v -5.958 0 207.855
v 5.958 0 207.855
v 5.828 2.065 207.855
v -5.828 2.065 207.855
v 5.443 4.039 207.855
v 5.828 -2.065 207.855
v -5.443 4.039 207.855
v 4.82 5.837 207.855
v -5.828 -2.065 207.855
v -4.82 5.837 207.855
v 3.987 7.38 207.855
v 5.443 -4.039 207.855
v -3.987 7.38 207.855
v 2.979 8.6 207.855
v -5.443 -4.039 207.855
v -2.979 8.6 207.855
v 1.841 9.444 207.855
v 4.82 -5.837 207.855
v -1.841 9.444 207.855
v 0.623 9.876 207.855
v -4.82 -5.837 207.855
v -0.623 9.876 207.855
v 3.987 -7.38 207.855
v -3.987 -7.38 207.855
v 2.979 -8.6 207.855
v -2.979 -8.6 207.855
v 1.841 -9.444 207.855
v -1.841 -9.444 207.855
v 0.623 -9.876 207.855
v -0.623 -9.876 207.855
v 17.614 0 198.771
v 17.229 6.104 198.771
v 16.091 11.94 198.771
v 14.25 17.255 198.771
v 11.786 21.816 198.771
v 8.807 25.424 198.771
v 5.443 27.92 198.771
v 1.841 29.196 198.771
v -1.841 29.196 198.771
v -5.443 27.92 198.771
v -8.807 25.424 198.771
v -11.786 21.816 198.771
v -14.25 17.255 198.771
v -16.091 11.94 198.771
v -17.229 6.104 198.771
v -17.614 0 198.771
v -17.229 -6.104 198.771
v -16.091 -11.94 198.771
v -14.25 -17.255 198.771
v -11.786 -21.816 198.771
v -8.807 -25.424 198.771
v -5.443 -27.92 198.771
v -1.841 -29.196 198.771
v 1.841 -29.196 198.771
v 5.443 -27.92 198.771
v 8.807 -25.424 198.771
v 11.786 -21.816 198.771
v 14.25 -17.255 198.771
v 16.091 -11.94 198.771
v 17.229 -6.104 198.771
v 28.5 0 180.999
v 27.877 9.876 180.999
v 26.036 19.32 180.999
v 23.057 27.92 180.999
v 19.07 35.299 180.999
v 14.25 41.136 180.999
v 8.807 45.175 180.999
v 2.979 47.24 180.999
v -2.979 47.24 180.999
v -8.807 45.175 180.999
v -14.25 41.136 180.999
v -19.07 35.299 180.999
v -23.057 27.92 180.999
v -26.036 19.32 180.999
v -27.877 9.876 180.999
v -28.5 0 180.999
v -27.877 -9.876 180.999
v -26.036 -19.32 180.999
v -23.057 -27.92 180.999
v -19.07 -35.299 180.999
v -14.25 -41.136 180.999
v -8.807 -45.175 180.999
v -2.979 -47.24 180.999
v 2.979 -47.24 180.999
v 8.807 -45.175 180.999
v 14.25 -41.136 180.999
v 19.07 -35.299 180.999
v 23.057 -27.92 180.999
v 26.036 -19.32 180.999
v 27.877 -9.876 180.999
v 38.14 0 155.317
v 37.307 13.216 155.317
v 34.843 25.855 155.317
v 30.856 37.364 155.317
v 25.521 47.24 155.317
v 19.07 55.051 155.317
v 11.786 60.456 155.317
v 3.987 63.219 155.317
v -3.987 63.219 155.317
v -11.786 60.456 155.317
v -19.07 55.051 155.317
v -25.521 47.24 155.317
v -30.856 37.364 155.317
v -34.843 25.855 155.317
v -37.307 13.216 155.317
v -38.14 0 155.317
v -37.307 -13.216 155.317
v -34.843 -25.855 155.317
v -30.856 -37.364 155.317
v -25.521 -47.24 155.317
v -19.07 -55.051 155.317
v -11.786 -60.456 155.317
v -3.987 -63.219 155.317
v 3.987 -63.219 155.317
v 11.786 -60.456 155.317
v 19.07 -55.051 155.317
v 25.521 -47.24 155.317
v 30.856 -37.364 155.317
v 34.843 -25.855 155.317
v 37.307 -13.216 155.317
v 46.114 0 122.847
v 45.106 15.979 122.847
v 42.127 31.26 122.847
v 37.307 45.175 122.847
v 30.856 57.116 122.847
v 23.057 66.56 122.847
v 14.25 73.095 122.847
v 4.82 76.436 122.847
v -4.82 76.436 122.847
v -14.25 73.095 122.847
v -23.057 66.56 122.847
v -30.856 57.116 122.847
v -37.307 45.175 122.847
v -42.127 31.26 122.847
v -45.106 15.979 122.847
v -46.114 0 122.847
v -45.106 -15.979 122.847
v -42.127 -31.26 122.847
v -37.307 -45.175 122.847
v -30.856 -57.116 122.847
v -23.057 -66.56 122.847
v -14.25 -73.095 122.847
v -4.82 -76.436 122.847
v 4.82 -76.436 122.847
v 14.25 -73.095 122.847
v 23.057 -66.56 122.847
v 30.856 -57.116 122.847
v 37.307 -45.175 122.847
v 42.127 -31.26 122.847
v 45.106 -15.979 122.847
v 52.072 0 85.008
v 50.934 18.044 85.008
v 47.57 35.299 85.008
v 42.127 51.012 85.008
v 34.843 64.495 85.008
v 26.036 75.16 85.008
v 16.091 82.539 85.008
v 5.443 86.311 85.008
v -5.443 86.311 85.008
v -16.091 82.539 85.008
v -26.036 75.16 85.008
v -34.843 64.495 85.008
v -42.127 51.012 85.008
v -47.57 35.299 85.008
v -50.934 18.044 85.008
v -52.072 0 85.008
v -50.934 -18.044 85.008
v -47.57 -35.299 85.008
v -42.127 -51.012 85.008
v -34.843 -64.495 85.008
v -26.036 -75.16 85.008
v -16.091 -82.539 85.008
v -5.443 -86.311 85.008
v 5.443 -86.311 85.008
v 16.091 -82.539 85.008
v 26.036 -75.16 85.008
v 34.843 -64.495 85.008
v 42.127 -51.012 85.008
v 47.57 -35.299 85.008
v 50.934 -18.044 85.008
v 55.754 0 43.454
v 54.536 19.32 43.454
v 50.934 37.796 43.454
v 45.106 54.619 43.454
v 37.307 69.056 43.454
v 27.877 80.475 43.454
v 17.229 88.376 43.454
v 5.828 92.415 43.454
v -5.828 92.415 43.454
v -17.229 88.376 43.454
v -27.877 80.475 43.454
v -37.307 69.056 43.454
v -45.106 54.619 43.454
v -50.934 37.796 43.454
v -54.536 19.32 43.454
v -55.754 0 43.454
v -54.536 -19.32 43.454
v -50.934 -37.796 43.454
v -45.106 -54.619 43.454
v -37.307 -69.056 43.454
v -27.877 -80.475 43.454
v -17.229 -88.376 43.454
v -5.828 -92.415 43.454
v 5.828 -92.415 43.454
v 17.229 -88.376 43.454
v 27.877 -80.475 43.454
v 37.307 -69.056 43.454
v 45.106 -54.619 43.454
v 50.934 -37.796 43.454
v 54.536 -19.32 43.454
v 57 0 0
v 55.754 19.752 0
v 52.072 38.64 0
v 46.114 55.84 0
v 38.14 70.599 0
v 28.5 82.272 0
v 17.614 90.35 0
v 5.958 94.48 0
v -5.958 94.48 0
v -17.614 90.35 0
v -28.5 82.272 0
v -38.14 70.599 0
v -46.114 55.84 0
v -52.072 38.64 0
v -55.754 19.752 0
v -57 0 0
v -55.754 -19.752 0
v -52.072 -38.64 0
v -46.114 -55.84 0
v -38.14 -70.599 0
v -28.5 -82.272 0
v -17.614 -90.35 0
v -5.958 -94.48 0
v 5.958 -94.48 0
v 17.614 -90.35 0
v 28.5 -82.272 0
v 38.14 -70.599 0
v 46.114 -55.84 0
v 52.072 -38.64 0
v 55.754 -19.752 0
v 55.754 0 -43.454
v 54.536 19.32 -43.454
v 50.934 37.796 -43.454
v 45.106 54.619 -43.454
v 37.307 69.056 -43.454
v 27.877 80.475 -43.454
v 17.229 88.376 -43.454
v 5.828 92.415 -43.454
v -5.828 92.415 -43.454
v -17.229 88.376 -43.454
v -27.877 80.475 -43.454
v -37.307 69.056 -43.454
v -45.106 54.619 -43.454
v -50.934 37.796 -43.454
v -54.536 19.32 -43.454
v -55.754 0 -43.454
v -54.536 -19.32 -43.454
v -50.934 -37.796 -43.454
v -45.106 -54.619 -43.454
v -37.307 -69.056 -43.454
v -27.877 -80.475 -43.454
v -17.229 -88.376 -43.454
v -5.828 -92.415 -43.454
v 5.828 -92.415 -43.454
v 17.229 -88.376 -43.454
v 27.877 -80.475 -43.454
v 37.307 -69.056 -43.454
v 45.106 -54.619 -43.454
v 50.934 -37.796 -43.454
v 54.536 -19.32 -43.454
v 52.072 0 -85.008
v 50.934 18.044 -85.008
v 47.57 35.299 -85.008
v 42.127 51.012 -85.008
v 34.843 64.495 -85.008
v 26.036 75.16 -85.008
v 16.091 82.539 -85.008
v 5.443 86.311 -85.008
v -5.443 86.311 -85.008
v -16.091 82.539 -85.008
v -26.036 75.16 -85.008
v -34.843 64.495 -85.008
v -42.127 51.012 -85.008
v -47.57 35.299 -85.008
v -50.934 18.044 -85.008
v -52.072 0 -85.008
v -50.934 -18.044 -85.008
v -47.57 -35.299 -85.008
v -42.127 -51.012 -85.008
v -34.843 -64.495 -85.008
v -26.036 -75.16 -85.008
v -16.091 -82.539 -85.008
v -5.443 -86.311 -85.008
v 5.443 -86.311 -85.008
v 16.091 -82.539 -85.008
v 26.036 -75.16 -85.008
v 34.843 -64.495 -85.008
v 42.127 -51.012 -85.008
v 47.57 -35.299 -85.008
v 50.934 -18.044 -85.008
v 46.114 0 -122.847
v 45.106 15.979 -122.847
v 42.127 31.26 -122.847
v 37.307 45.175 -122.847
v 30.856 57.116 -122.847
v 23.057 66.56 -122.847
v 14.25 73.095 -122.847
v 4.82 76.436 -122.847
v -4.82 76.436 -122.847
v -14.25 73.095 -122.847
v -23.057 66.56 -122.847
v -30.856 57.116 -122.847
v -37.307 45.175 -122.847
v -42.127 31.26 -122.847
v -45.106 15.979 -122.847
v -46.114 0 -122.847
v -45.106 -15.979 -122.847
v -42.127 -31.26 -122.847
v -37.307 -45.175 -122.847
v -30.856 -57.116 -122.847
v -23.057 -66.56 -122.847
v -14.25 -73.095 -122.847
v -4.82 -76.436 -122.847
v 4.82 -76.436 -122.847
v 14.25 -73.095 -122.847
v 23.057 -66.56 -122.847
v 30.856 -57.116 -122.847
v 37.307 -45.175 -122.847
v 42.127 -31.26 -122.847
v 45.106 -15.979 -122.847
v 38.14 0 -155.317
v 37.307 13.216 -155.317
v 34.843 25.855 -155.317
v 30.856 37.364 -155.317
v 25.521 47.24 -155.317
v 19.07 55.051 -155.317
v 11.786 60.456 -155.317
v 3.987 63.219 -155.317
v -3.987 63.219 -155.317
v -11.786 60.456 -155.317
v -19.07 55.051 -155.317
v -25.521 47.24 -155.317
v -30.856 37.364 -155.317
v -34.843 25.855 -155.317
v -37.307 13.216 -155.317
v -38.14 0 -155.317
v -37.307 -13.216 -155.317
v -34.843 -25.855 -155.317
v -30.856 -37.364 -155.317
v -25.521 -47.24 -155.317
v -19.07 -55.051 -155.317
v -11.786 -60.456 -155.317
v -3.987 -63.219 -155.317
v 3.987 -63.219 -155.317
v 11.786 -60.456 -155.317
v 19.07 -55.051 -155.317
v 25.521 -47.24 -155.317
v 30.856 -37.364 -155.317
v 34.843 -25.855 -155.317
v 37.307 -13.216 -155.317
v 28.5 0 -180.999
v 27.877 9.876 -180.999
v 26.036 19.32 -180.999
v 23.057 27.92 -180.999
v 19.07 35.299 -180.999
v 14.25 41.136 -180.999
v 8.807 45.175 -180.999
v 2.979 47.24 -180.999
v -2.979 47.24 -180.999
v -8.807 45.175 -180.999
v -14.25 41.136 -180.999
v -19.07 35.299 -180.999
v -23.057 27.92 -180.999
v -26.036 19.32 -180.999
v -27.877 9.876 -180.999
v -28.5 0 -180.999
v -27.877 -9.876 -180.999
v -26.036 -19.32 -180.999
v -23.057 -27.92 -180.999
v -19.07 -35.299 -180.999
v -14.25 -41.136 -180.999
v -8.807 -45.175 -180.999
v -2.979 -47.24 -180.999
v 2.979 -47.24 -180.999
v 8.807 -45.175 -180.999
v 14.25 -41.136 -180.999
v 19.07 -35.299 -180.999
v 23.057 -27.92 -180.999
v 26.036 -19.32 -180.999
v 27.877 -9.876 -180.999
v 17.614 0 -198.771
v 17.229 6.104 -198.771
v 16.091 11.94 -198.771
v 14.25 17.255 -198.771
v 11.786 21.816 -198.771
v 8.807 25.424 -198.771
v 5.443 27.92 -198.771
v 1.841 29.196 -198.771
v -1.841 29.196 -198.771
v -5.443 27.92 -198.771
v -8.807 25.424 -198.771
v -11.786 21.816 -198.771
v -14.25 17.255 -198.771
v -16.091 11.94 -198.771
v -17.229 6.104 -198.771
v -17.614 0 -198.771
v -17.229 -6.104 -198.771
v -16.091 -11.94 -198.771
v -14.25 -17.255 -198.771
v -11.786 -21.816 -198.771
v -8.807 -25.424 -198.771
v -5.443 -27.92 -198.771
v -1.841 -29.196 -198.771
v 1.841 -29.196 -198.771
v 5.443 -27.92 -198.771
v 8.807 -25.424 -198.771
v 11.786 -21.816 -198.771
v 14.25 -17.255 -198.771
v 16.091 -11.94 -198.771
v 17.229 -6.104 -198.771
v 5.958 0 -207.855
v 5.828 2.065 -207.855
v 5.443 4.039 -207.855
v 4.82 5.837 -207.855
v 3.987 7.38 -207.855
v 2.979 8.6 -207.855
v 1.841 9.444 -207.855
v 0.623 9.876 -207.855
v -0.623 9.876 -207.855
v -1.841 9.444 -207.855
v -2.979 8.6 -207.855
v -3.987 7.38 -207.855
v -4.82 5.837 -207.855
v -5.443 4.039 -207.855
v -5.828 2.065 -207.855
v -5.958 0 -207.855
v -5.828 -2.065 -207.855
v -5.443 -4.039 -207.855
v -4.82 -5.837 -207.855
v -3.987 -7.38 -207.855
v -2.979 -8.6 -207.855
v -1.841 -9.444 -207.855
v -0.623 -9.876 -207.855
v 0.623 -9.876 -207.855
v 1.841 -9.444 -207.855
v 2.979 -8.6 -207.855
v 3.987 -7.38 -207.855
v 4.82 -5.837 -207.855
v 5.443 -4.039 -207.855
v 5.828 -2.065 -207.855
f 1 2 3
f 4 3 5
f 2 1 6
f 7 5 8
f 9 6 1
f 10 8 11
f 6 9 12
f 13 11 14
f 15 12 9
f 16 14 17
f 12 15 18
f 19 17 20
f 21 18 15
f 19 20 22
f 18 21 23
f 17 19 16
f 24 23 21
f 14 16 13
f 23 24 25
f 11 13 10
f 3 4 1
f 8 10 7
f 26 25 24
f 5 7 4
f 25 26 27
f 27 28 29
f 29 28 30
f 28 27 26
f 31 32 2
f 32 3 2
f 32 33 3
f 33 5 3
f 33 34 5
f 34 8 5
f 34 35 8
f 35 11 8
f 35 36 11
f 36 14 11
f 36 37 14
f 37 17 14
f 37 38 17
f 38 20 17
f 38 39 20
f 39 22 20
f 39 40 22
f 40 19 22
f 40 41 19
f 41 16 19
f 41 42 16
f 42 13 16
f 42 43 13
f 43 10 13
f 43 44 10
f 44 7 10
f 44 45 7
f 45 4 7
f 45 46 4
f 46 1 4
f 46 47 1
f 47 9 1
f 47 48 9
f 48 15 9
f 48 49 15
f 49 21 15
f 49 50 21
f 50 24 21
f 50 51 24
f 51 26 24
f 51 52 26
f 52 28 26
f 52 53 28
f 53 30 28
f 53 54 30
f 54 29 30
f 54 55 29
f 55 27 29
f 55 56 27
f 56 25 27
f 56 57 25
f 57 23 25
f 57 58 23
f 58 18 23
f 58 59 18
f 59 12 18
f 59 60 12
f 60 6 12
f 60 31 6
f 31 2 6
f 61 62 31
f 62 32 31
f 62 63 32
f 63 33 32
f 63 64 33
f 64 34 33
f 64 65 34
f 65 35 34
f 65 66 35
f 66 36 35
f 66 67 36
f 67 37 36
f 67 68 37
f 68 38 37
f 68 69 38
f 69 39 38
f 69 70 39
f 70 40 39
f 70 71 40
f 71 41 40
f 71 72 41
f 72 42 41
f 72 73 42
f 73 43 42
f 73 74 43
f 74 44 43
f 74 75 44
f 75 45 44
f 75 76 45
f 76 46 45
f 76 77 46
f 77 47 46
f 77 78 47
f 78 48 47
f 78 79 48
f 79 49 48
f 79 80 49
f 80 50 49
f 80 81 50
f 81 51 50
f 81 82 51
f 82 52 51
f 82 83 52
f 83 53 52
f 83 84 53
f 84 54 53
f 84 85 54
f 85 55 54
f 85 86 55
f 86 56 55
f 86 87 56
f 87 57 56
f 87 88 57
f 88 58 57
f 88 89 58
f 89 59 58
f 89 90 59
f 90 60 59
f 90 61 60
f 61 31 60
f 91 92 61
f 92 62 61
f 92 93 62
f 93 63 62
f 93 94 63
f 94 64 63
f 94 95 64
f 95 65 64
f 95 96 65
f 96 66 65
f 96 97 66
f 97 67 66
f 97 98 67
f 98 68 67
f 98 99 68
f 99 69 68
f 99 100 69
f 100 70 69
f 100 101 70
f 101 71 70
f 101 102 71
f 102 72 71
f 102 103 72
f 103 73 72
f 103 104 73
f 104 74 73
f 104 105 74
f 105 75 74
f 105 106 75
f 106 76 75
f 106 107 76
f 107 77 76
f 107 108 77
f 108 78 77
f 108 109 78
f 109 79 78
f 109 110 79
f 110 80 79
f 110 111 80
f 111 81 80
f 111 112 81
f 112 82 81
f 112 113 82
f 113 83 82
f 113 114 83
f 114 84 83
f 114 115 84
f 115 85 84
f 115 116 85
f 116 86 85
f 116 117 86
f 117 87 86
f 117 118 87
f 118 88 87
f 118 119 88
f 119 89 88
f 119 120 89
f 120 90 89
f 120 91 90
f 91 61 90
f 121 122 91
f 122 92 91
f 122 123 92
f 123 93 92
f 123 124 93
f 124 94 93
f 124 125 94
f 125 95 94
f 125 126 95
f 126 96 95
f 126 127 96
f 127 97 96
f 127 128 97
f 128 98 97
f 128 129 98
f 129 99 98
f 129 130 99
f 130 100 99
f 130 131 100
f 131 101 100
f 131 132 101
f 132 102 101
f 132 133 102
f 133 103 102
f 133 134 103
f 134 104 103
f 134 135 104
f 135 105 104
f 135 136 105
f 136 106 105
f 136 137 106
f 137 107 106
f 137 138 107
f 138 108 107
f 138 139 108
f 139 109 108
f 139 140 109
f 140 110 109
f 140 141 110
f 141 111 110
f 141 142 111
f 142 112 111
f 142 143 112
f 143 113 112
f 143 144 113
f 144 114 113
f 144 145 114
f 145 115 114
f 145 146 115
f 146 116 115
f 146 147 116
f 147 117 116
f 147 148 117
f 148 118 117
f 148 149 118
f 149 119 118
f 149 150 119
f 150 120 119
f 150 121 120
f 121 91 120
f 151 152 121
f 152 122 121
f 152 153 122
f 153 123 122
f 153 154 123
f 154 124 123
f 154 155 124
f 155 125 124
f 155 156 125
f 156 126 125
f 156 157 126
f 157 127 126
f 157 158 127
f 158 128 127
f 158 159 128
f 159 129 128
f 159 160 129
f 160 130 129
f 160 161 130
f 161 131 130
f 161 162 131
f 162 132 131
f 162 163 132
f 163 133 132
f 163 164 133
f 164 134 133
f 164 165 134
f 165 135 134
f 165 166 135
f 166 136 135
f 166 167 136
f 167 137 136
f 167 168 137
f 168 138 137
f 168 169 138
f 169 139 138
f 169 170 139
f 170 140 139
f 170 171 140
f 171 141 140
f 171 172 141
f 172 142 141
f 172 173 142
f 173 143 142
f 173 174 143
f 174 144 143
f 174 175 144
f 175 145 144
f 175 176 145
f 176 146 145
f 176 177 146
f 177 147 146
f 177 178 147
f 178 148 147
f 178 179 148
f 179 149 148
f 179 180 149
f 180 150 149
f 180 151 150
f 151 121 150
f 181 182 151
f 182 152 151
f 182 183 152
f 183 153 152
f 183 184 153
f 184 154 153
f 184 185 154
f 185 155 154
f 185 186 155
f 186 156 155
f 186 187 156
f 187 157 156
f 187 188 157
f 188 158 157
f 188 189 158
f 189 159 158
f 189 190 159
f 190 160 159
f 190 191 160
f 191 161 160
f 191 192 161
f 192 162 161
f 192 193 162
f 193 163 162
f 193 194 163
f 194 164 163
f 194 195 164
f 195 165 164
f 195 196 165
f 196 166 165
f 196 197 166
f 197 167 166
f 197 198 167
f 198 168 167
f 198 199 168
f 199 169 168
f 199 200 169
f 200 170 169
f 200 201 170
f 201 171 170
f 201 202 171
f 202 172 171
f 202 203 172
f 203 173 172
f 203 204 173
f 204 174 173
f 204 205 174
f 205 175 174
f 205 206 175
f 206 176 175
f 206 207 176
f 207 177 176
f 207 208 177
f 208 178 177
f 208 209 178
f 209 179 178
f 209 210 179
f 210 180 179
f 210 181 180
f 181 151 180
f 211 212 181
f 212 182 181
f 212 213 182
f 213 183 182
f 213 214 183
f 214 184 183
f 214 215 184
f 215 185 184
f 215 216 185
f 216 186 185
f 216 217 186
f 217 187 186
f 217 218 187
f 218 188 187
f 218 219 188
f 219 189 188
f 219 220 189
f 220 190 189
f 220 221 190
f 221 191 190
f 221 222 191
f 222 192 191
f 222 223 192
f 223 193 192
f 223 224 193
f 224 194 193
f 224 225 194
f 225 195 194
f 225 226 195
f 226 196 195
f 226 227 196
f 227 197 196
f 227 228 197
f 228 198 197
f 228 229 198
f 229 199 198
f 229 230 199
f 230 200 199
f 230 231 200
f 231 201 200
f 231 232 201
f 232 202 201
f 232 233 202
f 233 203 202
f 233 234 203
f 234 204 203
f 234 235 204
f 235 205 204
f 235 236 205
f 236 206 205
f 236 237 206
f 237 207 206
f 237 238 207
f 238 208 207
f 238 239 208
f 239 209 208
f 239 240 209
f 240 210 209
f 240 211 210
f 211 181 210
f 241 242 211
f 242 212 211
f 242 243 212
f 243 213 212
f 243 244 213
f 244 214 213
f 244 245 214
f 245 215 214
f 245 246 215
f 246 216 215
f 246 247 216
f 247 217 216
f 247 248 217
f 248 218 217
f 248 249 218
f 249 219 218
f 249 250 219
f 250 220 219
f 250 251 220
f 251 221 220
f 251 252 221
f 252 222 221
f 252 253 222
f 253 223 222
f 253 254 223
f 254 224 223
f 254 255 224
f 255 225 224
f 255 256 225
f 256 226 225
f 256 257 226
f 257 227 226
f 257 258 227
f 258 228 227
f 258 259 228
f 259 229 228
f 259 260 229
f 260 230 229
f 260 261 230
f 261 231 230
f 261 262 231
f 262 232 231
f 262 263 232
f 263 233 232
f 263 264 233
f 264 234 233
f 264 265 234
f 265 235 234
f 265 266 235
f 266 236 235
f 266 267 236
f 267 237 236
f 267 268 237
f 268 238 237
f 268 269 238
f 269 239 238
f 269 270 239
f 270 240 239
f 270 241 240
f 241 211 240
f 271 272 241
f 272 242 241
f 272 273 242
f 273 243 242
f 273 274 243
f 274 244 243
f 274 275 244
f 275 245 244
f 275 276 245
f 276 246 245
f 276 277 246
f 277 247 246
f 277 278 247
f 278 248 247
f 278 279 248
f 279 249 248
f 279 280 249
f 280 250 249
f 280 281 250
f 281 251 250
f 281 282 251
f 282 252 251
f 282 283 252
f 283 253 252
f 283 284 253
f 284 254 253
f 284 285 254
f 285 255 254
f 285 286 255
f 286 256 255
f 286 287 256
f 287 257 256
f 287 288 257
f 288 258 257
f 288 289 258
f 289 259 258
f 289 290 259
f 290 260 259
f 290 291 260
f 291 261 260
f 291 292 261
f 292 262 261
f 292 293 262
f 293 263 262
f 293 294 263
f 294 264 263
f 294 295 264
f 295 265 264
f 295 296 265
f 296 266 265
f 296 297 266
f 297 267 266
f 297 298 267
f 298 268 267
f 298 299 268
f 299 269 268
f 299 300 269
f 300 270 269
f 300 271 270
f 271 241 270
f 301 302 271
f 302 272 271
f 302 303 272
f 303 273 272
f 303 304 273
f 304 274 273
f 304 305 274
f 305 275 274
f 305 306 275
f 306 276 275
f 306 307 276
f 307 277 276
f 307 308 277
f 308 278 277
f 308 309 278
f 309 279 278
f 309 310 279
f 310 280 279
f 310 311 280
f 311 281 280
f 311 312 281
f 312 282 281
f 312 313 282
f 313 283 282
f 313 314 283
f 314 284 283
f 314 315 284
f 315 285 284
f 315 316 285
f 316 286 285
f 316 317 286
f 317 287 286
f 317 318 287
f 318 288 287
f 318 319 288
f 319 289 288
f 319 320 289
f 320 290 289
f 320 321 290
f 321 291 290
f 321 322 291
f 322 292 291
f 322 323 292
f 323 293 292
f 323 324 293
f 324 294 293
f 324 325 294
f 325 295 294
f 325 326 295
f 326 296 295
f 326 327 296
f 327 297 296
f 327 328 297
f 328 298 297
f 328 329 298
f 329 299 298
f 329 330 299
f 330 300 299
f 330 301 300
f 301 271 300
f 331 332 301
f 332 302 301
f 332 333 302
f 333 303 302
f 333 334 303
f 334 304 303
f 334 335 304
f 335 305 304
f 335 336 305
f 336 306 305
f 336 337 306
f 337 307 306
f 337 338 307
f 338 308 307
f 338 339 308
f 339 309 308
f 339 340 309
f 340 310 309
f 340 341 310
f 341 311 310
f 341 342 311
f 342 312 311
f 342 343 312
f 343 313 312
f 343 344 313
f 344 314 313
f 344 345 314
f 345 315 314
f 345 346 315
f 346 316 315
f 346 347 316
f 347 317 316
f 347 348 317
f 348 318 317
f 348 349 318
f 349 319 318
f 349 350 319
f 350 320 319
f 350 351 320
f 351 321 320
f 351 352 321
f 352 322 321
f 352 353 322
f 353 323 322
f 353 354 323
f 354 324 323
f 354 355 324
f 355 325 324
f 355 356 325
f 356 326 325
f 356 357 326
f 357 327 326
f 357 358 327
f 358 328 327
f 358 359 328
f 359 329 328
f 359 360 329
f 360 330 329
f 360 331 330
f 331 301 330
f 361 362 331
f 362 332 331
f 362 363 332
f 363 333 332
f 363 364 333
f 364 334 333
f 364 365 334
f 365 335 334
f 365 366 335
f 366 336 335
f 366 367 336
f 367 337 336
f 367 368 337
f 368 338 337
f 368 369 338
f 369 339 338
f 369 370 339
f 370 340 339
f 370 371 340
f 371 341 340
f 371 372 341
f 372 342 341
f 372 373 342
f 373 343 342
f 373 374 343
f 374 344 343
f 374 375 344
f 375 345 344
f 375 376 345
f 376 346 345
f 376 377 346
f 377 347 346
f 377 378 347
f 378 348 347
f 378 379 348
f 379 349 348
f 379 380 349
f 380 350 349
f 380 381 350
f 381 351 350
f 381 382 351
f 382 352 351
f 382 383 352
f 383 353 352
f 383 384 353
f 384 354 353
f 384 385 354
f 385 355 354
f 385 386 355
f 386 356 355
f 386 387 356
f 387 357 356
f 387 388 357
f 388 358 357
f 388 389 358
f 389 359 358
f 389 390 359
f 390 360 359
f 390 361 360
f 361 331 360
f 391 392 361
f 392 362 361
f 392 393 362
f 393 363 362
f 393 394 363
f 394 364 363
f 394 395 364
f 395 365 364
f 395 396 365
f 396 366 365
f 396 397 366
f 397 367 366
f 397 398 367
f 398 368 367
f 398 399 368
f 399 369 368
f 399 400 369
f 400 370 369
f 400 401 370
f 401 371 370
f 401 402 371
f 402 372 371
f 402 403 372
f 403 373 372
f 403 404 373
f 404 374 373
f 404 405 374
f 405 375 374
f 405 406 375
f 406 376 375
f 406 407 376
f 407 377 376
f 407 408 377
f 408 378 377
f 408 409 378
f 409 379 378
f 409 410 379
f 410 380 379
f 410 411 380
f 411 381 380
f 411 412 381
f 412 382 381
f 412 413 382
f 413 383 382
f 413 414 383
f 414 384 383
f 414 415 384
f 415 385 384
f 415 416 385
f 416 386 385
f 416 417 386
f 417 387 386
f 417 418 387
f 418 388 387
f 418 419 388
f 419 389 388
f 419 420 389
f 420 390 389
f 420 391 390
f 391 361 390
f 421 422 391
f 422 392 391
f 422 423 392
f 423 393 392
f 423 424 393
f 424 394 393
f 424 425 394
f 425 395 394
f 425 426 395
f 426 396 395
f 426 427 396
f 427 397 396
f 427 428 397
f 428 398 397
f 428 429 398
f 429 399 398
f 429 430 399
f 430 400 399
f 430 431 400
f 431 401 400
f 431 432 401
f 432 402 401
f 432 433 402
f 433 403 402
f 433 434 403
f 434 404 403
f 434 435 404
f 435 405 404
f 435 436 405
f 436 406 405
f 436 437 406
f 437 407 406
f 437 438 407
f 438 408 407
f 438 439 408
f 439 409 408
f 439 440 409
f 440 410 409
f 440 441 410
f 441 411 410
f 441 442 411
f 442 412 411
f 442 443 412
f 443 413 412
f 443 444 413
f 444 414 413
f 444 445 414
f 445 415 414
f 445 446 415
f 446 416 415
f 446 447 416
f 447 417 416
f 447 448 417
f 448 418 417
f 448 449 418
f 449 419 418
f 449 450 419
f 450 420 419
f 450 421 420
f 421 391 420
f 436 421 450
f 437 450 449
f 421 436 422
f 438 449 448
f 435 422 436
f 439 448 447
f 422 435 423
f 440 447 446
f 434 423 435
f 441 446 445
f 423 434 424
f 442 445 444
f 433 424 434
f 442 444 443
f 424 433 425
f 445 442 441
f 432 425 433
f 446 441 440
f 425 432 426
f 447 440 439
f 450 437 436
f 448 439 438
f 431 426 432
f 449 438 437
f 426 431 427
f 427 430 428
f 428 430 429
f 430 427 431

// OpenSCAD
// Generated by SolidPython 1.0.1 on 2020-07-29 00:39:25


scale(v = [3, 5, 11]) {
	sphere(r = 19);
}
/***********************************************
*********      SolidPython code:      **********
************************************************
 
# import packages: SolidPython
from solid import *
from solid.utils import *
from itertools import chain, combinations


class Resize:

    def __init__(self, scad_file):
        self.scad_file = scad_file
        #self.scad_file = import_scad(scad_file)
        # cone/cylinder param:
        self.r1 = 0
        self.r2 = 0
        self.h = 0
        # rectangular prism param:
        self.w = 0
        self.l = 0
        # ellipse param:
        self.r = 0

    # import OpenScad code (file name corresponds to shape)


    # classify shape + parameters
    def assign(self, param1, param2, param3):
        if self.scad_file == 'cone.scad':
            self.r1 = param1
            self.r2 = param2
            self.h = param3
        elif self.scad_file == 'cylinder.scad':
            self.r1 = param1
            self.r2 = param2
            self.h = param3
        elif self.scad_file == 'rectangularPrism.scad':
            self.h = param1
            self.l = param2
            self.w = param3
        else:
            self.r = param1
            self.h = param2

    # resize parameters
    def iterate(self):
        x = range(3, 20, 2)
        i = 1
        if self.scad_file == 'cone.scad':
            tempList = list(combinations(x, 2))
            for temp in tempList:
                param1 = temp[0]
                param2 = temp[1]
                filepath = 'produced_scad_files/' + 'cone' + str(param1) + '_' + str(param2) + '_' + '.scad'
                scad_render_to_file(cylinder(h=param1, r1=param2, r2=0), filepath)

        elif self.scad_file == 'cylinder.scad':
            tempList = list(combinations(x, 3))
            for temp in tempList:
                param1 = temp[0]
                param2 = temp[1]
                filepath = 'produced_scad_files/' + 'cylinder' + str(param1) + '_' + str(param2) + '_' + '.scad'
                scad_render_to_file(cylinder(h=param1, r1=param2, r2=param2), filepath)

        elif self.scad_file == 'rectangularPrism.scad':
            tempList = list(combinations(x, 3))
            for temp in tempList:
                param1 = temp[0]
                param2 = temp[1]
                param3 = temp[2]
                filepath = 'produced_scad_files/' + 'rectangularPrism' + str(param1) + '_' + str(param2) + '_' + str(
                    param3) + '.scad'
                scad_render_to_file(cube(size=(param1, param2, param3)), filepath)

        elif self.scad_file == 'ellipse.scad':
            tempList = list(combinations(x, 4))
            for temp in tempList:
                param1 = temp[0]
                param2 = temp[1]
                param3 = temp[2]
                param4 = temp[3]
                filepath = 'produced_scad_files/' + 'ellipse' + str(param1) + '_' + str(param2) + '_' + str(param3) + '_' + str(param4) + '.scad'
                scad_render_to_file(scale([param1, param2, param3])(sphere(r=param4)), filepath)

    def render_to_scadfile(self):
        scad_render_to_file(scad, 'example.scad') 
 
************************************************/
